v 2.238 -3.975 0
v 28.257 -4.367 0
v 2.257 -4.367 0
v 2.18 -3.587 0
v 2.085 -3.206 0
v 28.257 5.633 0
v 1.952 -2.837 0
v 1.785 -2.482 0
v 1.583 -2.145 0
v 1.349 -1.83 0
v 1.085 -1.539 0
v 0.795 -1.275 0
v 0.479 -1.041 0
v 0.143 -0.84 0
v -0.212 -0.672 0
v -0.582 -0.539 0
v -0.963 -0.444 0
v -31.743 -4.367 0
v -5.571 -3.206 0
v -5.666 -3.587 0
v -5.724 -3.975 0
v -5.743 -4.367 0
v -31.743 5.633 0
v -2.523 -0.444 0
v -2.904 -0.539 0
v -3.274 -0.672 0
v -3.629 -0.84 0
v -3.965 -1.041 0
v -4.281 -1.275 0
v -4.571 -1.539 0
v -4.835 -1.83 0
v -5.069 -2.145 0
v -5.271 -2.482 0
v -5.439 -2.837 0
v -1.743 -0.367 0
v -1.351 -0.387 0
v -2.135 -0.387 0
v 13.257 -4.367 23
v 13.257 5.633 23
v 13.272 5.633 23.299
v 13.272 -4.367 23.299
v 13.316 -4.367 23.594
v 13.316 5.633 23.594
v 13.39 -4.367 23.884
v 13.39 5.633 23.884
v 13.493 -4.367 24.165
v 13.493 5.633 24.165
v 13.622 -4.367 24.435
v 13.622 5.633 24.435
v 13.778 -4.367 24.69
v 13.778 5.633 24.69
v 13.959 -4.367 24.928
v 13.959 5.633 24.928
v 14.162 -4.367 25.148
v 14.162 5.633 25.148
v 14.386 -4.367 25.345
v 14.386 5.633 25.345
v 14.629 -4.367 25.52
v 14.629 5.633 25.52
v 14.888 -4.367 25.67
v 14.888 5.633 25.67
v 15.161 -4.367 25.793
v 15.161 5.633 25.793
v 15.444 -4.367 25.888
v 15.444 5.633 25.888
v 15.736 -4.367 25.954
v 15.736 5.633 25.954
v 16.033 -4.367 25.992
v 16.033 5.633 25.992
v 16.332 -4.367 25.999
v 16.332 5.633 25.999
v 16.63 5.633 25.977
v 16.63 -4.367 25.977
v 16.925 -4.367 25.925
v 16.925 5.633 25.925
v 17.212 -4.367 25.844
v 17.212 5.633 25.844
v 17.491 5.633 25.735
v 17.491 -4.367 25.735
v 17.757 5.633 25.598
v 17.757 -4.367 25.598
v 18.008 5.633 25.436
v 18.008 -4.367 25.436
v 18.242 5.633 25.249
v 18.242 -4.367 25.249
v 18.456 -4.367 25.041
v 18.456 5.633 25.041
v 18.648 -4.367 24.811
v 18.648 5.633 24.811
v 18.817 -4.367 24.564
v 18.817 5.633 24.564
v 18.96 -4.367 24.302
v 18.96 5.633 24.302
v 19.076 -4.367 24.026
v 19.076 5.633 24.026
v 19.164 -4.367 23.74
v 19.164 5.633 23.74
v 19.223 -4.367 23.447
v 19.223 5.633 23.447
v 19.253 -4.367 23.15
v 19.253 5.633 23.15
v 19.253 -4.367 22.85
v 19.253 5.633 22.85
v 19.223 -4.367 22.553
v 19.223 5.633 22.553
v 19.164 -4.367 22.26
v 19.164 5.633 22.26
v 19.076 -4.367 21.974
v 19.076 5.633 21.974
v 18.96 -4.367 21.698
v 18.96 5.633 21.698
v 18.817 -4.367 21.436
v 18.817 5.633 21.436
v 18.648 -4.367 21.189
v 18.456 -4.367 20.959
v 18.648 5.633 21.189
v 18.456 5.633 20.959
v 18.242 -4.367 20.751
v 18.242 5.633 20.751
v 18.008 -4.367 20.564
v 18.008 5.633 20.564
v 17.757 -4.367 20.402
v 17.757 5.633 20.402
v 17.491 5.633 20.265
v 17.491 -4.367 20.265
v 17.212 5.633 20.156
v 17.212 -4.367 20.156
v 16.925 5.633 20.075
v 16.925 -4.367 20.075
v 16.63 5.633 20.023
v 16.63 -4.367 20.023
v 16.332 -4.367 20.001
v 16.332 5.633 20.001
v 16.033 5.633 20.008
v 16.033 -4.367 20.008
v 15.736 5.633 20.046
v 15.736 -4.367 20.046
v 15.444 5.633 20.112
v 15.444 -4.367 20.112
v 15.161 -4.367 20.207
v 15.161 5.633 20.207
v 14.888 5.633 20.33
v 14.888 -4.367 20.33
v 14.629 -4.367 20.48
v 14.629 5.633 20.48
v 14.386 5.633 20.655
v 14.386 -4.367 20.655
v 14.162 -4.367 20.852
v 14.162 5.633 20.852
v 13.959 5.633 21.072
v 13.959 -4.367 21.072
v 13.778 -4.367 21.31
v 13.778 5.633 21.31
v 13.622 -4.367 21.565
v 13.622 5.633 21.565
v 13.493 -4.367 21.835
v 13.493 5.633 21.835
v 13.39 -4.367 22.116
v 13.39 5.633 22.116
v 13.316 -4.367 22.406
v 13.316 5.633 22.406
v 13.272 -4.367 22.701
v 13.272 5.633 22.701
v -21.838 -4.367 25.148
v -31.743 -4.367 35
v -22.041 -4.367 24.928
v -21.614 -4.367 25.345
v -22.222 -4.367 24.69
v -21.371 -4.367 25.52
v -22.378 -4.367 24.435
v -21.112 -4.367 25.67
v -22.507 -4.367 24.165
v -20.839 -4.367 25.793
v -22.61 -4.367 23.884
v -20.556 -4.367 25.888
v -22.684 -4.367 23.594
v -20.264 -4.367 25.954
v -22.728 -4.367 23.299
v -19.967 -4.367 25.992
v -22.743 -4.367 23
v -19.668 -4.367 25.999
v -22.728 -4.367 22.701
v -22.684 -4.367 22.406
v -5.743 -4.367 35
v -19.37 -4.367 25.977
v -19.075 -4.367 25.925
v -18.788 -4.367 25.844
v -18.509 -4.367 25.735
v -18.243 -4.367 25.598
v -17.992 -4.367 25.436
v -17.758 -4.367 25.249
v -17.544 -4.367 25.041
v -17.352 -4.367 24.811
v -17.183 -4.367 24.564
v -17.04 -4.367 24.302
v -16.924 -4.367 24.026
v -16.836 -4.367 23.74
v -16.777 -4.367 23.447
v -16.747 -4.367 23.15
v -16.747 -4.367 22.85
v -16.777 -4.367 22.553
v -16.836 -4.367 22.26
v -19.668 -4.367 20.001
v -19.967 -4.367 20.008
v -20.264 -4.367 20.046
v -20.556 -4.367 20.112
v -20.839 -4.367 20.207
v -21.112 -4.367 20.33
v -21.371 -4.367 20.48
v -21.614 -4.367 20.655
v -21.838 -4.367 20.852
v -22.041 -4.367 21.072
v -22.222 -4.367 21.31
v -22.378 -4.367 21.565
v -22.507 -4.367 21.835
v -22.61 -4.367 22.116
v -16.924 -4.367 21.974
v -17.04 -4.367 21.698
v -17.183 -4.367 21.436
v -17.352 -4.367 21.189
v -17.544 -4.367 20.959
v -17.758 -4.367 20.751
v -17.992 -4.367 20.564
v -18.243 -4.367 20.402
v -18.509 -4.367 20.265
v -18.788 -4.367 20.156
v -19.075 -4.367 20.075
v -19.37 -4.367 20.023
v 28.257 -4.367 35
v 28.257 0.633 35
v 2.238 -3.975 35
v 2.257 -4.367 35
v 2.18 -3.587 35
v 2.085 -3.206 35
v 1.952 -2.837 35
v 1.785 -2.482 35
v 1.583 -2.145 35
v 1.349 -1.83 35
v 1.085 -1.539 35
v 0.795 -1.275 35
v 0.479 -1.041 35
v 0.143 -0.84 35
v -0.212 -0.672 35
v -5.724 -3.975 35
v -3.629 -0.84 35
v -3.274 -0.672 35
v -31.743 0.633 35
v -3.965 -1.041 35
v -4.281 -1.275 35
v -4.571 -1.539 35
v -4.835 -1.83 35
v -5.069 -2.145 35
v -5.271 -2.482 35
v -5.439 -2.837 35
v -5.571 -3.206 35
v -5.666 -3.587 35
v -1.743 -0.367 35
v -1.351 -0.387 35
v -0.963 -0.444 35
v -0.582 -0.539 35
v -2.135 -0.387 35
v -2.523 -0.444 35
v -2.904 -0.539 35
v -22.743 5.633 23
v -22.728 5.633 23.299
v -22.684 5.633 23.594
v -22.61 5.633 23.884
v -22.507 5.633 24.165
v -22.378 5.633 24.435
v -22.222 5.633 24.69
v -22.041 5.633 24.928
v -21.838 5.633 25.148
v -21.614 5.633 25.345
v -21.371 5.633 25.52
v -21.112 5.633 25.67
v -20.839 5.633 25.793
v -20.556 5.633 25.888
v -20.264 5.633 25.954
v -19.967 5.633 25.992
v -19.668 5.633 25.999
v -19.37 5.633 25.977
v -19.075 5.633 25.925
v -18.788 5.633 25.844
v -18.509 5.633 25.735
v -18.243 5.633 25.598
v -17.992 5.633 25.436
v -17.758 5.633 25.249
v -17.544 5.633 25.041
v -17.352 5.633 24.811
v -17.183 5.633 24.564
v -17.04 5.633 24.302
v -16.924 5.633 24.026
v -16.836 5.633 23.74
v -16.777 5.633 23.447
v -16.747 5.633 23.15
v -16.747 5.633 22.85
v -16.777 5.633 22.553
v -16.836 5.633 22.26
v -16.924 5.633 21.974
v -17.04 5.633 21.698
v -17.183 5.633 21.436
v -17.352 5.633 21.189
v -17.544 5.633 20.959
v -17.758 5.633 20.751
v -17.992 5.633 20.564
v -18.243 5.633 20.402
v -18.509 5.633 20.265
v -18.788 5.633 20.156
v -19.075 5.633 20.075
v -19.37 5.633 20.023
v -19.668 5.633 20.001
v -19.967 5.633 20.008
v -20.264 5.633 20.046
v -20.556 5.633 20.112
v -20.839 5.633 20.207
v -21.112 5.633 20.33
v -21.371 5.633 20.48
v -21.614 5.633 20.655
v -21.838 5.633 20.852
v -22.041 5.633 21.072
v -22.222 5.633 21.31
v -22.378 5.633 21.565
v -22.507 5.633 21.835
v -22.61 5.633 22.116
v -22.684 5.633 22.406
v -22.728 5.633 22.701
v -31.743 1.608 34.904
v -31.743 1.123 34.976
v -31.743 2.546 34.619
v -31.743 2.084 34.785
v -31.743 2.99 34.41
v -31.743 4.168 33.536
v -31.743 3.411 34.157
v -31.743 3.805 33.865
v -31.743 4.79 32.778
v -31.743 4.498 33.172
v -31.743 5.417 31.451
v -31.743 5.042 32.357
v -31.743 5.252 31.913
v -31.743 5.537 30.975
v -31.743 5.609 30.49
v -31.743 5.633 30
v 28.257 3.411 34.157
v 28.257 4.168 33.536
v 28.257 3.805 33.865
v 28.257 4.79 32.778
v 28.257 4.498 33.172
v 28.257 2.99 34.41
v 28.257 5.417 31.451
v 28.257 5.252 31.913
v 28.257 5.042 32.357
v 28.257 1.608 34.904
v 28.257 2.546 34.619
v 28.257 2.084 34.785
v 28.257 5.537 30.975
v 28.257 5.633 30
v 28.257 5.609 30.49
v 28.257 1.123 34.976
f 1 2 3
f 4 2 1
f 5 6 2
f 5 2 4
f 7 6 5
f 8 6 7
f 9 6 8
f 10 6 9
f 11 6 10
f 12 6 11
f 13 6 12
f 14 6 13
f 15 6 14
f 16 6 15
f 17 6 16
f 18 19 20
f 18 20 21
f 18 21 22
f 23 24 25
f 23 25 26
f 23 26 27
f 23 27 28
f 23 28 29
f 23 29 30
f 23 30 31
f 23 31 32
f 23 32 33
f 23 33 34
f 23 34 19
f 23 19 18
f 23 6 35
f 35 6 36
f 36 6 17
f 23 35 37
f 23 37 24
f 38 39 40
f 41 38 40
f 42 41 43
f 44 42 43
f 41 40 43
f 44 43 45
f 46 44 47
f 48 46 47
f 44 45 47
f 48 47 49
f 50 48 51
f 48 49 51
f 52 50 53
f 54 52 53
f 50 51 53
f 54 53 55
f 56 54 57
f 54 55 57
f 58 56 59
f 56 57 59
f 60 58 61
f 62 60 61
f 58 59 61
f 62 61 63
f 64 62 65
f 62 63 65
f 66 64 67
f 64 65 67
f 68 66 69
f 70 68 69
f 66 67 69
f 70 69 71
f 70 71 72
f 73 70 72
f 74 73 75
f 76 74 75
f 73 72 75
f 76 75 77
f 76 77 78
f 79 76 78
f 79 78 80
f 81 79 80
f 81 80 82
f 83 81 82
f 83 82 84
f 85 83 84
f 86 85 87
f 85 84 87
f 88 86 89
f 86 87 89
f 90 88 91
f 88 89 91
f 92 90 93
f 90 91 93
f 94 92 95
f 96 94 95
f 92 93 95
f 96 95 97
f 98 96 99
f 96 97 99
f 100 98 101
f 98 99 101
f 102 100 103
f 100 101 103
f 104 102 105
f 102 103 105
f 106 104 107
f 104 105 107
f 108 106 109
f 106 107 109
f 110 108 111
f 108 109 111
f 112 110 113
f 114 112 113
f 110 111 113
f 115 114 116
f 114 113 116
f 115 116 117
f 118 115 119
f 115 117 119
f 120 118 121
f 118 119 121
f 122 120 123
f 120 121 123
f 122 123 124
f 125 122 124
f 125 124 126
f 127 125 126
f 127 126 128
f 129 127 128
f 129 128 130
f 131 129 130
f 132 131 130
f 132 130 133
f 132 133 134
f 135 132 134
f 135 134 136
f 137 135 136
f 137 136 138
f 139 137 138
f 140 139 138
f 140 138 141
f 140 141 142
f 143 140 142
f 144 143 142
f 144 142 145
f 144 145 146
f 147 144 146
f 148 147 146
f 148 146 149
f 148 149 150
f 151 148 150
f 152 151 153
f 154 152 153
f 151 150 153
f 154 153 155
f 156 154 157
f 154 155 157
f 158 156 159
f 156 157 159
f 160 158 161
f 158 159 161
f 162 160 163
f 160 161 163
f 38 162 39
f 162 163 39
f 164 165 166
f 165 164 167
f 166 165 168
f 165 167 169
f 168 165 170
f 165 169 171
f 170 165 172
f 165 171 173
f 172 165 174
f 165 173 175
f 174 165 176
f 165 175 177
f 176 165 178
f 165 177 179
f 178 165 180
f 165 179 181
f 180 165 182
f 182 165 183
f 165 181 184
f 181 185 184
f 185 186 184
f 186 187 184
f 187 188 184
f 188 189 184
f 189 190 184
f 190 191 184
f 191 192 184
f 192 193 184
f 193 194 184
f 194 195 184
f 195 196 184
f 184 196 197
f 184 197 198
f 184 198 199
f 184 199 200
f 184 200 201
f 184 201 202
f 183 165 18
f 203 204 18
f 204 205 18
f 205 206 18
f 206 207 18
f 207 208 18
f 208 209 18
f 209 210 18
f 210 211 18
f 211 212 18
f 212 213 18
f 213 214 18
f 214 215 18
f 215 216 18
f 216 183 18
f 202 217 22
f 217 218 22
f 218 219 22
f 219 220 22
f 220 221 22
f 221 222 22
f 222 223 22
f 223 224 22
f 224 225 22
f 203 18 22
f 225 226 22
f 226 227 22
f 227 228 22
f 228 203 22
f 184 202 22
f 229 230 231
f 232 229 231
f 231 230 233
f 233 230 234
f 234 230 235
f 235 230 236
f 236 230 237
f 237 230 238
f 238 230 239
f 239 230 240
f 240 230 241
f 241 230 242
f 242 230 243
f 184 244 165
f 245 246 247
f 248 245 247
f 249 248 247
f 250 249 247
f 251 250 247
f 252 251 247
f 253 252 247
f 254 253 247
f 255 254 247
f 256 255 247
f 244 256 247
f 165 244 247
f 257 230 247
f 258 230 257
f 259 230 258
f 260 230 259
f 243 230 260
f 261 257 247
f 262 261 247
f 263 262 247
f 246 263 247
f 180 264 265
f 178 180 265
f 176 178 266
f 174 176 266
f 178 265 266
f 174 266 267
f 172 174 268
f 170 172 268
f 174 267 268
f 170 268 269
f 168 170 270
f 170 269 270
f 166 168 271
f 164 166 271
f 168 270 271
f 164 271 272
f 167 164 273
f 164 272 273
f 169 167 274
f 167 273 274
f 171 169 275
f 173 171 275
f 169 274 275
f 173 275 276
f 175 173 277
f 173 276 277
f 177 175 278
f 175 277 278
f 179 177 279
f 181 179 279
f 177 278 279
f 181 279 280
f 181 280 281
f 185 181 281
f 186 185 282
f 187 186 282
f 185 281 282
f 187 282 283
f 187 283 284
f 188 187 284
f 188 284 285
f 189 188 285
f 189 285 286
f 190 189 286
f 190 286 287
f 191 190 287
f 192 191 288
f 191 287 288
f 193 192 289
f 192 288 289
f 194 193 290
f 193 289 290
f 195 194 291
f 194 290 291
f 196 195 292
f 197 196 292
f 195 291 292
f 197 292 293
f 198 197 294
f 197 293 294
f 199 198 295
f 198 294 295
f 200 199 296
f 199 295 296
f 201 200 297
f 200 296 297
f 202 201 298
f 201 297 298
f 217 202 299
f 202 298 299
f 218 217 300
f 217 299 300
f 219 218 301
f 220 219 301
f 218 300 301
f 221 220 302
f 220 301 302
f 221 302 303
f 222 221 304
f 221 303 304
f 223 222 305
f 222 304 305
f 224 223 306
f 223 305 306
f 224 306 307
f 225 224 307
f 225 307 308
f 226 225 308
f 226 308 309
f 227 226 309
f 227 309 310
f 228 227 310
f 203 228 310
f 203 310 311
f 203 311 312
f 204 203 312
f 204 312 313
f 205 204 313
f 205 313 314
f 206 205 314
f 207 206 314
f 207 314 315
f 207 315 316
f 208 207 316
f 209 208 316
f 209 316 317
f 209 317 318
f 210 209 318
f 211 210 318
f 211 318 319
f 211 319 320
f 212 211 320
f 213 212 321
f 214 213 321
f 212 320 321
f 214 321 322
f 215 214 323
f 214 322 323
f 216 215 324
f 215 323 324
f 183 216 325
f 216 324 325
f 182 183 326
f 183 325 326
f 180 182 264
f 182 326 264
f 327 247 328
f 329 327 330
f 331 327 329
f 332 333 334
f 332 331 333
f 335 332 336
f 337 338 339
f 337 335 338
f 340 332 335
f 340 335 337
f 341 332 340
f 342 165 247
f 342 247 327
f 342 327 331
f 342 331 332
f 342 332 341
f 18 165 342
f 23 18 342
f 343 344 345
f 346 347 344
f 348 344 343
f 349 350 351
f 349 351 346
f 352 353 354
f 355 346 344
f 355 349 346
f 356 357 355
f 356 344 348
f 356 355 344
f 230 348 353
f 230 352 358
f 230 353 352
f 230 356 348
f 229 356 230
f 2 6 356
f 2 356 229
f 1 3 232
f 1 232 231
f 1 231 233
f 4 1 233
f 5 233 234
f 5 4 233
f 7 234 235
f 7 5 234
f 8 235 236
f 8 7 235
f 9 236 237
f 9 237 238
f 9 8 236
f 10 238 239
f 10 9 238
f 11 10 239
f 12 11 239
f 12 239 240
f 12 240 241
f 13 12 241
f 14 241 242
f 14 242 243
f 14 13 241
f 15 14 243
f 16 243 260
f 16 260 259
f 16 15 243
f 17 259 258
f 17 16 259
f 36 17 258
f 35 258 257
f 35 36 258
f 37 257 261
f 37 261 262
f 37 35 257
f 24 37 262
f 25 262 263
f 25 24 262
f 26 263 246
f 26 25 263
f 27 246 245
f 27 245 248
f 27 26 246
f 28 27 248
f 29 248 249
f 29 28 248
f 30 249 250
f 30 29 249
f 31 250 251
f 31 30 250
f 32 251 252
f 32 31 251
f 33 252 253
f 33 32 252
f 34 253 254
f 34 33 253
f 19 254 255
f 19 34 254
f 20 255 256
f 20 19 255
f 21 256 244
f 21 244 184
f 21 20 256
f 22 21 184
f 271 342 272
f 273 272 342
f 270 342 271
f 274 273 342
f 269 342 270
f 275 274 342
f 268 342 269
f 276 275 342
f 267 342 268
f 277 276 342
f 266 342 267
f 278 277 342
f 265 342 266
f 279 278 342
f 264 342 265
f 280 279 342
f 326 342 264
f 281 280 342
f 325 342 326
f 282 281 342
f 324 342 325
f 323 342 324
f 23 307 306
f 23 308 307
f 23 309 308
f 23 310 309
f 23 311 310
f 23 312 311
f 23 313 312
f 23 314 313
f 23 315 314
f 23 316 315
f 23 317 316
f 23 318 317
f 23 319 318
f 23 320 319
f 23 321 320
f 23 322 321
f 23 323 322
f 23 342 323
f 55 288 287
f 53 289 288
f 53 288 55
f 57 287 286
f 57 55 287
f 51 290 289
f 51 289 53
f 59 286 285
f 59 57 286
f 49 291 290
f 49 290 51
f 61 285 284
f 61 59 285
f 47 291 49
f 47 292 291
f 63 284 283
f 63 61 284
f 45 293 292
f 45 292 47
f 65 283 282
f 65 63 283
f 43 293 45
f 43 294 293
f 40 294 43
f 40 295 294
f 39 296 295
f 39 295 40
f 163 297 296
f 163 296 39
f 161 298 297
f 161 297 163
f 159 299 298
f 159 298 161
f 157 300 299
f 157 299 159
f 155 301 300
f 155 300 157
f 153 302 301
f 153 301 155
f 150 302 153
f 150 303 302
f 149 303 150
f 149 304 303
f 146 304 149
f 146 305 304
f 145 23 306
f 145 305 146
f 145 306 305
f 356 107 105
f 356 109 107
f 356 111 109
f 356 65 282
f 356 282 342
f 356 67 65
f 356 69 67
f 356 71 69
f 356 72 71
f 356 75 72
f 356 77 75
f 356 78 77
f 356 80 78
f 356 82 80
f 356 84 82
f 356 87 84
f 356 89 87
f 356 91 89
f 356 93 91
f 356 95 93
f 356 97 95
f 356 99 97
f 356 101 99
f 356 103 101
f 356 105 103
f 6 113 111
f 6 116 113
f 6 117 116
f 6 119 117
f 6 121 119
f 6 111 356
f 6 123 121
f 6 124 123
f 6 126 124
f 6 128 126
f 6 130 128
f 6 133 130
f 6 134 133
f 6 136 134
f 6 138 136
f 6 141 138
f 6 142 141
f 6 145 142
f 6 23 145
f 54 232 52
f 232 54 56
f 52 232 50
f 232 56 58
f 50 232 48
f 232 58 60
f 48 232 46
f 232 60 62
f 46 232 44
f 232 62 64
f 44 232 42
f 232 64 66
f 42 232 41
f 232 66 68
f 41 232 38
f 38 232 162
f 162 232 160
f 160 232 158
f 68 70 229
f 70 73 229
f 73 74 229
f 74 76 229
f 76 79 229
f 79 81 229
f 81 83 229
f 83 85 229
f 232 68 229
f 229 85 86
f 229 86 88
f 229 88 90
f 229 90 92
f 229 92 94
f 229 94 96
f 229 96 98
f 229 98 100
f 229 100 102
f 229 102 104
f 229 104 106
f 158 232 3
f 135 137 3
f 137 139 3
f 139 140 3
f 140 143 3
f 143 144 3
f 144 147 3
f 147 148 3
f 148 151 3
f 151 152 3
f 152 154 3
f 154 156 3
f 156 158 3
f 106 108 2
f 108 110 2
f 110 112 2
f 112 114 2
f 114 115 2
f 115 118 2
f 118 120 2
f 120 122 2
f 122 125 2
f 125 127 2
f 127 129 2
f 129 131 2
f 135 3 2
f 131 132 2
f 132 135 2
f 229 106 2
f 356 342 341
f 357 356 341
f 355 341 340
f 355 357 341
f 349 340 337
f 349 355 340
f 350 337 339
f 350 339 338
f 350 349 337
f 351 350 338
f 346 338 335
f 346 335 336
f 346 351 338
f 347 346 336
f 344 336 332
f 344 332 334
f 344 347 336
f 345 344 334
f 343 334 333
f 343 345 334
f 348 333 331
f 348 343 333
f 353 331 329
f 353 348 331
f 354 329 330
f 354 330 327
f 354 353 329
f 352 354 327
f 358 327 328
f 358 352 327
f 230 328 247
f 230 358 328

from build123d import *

# Parameters (mm, degrees)
PAD_DEPTH    = 35
SKETCH001_R  = 3
POCKET_DEPTH = 10
FILLET_R     = 5


with BuildPart() as part:
    # Sketch → Pad (new body)
    with BuildSketch(Plane.XY):
        with BuildLine():
            Line((-31.743039, 5.632756), (28.256961, 5.632756))
            Line((28.256961, 5.632756), (28.256961, -4.367244))
            Line((2.256961, -4.367244), (28.256961, -4.367244))
            ThreePointArc((2.256961, -4.367244), (-1.743039, -0.367244), (-5.743039, -4.367244))
            Line((-31.743039, -4.367244), (-5.743039, -4.367244))
            Line((-31.743039, -4.367244), (-31.743039, 5.632756))
        make_face()
    extrude(amount=PAD_DEPTH)

    # Sketch001 → Pocket (cut)
    with BuildSketch(Plane(origin=(0, 5.632756, 0), x_dir=(-1, 0, 0), z_dir=(0, 1, 0))):
        with Locations((-16.256961, 23)):
            Circle(SKETCH001_R)
        with Locations((19.743039, 23)):
            Circle(SKETCH001_R)
    extrude(amount=-POCKET_DEPTH, mode=Mode.SUBTRACT)

    # Fillet
    fillet_edges = [part.edges().sort_by_distance(p)[0] for p in [
        (-1.743039, 5.632756, 35),
    ]]
    fillet(fillet_edges, radius=FILLET_R)


solid = part.part
